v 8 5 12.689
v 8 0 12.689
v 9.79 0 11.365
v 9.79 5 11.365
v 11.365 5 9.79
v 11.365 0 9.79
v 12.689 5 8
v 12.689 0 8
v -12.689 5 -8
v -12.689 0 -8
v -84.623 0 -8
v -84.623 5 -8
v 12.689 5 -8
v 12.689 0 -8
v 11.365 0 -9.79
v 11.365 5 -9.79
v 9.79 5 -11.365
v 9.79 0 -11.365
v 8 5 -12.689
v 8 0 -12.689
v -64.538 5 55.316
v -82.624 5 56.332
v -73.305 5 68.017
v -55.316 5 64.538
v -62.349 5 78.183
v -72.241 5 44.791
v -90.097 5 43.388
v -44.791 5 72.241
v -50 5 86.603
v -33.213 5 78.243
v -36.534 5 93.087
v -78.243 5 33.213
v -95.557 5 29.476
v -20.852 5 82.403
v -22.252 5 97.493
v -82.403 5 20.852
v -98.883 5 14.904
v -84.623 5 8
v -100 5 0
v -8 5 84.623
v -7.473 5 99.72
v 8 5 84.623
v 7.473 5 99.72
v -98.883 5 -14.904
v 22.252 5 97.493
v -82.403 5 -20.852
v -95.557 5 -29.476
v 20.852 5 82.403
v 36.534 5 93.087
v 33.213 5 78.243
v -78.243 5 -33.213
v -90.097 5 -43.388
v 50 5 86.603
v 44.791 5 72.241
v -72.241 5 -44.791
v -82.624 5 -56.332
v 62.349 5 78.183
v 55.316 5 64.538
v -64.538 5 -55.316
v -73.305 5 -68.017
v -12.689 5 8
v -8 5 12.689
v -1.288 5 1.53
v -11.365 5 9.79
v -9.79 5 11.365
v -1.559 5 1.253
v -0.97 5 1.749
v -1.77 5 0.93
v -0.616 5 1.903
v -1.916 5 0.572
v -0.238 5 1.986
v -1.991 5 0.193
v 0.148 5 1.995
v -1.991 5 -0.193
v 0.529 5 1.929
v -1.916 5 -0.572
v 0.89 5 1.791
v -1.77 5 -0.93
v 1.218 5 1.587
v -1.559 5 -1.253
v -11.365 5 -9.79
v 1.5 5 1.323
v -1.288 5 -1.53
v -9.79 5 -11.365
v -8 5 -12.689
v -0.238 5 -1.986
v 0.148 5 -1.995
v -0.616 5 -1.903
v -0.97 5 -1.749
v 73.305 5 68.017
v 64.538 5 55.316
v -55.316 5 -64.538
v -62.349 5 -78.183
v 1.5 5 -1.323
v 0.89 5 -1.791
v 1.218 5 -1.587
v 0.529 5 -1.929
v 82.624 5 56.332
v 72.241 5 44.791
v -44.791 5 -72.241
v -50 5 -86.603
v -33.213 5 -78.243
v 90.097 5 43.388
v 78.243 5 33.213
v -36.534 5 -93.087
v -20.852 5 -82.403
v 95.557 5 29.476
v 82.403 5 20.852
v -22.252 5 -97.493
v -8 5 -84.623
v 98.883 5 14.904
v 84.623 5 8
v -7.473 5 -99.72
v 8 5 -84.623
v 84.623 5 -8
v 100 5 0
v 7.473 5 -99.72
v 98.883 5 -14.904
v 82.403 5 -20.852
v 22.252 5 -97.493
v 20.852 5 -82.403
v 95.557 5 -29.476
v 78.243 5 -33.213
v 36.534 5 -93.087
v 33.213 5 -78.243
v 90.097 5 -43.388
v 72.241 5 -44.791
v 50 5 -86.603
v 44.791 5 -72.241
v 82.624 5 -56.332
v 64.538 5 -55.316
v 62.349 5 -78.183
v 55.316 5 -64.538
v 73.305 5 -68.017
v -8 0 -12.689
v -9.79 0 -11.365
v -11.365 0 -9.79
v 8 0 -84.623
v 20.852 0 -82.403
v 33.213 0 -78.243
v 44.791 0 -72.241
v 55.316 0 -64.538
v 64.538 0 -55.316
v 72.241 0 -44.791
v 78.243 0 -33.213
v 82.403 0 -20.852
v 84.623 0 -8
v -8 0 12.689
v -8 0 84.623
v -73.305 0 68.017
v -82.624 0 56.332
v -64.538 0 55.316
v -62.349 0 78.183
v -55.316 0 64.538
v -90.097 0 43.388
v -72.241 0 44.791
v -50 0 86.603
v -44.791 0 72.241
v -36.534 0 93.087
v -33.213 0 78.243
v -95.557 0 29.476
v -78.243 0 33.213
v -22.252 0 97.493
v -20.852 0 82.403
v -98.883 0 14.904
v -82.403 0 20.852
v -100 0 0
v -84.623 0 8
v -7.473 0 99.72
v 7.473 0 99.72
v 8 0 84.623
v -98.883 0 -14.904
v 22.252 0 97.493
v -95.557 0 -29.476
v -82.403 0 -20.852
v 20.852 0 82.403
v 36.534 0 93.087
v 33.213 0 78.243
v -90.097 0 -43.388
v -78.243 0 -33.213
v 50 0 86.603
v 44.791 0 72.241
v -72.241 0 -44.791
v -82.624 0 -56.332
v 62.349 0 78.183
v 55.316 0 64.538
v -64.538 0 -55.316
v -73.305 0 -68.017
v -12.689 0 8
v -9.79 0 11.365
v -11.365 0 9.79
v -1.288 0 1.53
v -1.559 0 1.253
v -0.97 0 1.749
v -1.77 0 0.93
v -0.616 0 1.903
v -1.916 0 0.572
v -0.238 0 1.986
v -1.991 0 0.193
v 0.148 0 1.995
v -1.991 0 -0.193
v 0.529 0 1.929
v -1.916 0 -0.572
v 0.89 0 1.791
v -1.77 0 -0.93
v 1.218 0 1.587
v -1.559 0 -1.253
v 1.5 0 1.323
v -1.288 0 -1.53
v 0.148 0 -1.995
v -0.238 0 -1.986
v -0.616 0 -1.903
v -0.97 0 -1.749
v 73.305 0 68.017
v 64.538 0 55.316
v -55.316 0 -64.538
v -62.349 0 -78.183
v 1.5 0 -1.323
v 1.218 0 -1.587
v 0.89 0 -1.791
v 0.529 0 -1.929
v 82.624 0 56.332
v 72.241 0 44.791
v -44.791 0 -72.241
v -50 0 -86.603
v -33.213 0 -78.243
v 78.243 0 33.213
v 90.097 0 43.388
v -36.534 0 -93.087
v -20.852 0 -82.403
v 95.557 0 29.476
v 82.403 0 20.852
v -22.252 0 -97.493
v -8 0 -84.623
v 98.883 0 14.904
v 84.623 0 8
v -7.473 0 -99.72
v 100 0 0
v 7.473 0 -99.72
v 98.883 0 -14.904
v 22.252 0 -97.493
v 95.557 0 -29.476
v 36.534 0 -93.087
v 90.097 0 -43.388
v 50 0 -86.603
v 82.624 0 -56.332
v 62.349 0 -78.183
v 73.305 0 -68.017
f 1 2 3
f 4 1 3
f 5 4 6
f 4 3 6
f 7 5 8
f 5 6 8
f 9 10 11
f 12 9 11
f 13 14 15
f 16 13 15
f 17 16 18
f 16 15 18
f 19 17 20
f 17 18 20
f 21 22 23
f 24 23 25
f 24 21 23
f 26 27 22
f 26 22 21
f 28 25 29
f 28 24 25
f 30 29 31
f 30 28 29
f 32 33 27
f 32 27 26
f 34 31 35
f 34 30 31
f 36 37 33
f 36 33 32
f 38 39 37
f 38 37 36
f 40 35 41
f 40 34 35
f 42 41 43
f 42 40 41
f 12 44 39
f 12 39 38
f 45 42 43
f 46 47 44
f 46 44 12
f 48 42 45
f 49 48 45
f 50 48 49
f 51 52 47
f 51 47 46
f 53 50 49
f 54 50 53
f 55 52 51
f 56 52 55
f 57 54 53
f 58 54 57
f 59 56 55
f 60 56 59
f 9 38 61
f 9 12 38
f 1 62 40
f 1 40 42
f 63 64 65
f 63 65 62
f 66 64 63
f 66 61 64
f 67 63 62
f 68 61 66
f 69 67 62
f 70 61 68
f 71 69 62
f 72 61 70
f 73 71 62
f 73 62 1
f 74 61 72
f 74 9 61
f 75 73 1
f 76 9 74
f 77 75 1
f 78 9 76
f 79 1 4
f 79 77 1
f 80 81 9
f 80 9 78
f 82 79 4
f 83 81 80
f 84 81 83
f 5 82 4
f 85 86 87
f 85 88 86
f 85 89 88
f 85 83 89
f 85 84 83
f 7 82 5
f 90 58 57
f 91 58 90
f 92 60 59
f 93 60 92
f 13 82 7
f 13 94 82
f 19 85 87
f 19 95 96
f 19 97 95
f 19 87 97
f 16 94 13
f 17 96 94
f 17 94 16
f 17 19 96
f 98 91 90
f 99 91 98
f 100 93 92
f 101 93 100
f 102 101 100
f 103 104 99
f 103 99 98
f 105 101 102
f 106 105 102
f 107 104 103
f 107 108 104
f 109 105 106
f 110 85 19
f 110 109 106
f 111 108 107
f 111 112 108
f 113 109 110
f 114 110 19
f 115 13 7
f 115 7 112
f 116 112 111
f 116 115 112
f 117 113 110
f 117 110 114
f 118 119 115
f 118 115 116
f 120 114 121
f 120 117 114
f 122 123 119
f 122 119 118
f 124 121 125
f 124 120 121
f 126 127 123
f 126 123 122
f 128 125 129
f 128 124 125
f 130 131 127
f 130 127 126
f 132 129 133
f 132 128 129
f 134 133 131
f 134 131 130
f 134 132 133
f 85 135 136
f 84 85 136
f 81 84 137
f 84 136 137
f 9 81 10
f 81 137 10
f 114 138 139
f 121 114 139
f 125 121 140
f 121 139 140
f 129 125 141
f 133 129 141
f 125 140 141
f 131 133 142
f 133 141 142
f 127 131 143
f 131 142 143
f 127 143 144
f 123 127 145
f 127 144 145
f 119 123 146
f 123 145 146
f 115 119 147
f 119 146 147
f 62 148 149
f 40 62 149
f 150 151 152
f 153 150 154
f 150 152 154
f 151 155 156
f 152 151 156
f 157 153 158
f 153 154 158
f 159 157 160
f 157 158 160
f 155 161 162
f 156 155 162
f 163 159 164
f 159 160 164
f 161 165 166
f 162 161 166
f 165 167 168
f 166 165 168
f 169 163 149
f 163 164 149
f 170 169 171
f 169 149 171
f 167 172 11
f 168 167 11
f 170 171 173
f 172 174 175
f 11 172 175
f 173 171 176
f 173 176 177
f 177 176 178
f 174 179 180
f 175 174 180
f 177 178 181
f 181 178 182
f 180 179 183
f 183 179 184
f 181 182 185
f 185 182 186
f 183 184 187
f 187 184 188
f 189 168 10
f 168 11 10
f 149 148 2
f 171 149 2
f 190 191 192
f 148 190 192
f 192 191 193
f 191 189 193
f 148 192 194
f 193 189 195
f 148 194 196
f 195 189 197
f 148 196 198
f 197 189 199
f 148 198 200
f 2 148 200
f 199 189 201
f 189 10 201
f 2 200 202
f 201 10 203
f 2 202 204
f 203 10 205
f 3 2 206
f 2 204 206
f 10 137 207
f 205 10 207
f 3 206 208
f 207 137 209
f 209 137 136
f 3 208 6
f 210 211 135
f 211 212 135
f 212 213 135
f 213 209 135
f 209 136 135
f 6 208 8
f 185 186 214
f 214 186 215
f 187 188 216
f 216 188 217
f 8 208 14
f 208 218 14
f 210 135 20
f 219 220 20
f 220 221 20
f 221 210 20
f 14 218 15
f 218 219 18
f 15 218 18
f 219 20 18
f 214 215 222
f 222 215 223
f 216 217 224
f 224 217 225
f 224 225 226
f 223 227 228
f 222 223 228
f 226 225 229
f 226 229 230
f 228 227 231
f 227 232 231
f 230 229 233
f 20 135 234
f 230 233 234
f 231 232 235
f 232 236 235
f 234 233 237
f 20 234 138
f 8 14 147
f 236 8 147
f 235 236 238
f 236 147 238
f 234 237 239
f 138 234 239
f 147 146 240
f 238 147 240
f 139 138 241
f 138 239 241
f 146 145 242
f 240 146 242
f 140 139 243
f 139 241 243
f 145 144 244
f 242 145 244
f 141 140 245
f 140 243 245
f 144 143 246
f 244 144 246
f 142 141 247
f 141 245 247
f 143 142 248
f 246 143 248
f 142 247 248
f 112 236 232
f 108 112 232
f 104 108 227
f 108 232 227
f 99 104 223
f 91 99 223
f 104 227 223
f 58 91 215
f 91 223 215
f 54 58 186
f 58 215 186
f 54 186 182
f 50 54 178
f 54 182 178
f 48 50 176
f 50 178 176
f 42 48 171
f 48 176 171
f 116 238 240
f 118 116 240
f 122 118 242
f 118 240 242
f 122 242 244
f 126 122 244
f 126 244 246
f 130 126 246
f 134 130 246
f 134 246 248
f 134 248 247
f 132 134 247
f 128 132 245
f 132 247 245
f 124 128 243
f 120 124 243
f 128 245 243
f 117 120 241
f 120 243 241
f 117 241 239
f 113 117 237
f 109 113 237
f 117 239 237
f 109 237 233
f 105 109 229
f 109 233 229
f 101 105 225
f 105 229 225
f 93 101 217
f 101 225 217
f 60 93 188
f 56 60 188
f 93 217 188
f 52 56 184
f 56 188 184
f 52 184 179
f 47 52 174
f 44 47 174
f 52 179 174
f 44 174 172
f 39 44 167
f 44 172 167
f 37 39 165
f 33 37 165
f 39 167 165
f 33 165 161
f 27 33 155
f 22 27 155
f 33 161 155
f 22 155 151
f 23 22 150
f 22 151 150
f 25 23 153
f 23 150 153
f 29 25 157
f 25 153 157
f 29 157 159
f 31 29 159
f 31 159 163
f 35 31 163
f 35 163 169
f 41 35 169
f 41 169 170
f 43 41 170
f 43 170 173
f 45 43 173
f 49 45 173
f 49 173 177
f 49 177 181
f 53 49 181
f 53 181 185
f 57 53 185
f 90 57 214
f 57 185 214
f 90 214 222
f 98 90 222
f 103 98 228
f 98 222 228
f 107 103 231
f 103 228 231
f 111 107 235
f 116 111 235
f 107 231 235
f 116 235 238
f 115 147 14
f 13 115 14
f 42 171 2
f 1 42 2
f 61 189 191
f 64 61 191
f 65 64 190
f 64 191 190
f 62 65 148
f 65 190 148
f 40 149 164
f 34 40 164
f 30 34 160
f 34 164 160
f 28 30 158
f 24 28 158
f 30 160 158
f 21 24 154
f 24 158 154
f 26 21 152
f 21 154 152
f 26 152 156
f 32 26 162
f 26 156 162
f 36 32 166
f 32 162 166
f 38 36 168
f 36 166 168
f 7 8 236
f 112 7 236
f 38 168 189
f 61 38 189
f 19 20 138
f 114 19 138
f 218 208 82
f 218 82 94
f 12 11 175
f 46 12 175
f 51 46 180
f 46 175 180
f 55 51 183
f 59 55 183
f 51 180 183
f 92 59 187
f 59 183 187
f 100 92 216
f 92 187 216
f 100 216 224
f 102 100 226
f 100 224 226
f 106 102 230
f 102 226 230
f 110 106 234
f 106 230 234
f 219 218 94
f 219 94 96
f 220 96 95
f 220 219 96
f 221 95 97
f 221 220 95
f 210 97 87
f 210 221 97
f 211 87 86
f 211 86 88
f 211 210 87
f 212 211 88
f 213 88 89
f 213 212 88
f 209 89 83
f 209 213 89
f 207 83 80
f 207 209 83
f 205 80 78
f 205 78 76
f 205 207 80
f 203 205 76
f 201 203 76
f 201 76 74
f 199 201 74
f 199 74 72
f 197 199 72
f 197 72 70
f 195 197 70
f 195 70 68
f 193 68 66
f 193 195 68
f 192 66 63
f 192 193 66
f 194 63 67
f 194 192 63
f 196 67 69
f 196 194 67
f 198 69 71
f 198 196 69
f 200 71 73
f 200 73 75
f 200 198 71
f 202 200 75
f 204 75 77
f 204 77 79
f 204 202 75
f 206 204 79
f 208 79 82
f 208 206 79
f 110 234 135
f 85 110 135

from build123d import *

# Parameters (mm, degrees)
SKETCH2_R           = 100
BOSS_EXTRUDE1_DEPTH = 5
CUT_EXTRUDE2_DEPTH  = 5


with BuildPart() as part:
    # Sketch2 → Boss-Extrude1 (new body)
    with BuildSketch(Plane(origin=(0, 0, 0), x_dir=(1, 0, 0), z_dir=(0, 1, 0))):
        Circle(SKETCH2_R)
        with BuildLine():
            Line((-8, -12.68857754), (-8, -84.622691992))
            ThreePointArc((-8, -84.622691992), (-60.104076401, -60.104076401), (-84.622691992, -8))
            Line((-84.622691992, -8), (-12.68857754, -8))
            ThreePointArc((-12.68857754, -8), (-10.606601718, -10.606601718), (-8, -12.68857754))
        make_face(mode=Mode.SUBTRACT)
        with BuildLine():
            Line((12.68857754, -8), (84.622691992, -8))
            ThreePointArc((84.622691992, -8), (60.104076401, -60.104076401), (8, -84.622691992))
            Line((8, -84.622691992), (8, -12.68857754))
            ThreePointArc((8, -12.68857754), (10.606601718, -10.606601718), (12.68857754, -8))
        make_face(mode=Mode.SUBTRACT)
        with BuildLine():
            Line((-8, 84.622691992), (-8, 12.68857754))
            ThreePointArc((-8, 12.68857754), (-10.606601718, 10.606601718), (-12.68857754, 8))
            Line((-12.68857754, 8), (-84.622691992, 8))
            ThreePointArc((-84.622691992, 8), (-60.104076401, 60.104076401), (-8, 84.622691992))
        make_face(mode=Mode.SUBTRACT)
        with BuildLine():
            ThreePointArc((8, 84.622691992), (60.104076401, 60.104076401), (84.622691992, 8))
            Line((84.622691992, 8), (12.68857754, 8))
            ThreePointArc((12.68857754, 8), (10.606601718, 10.606601718), (8, 12.68857754))
            Line((8, 12.68857754), (8, 84.622691992))
        make_face(mode=Mode.SUBTRACT)
    extrude(amount=BOSS_EXTRUDE1_DEPTH)

    # Sketch3 → Cut-Extrude2 (cut)
    with BuildSketch(Plane.XZ):
        with BuildLine():
            Line((1.5, 0), (1.5, -1.322875656))
            ThreePointArc((1.5, -1.322875656), (-2, 0), (1.5, 1.322875656))
            Line((1.5, 1.322875656), (1.5, 0))
        make_face()
    extrude(amount=-CUT_EXTRUDE2_DEPTH, mode=Mode.SUBTRACT)


solid = part.part
